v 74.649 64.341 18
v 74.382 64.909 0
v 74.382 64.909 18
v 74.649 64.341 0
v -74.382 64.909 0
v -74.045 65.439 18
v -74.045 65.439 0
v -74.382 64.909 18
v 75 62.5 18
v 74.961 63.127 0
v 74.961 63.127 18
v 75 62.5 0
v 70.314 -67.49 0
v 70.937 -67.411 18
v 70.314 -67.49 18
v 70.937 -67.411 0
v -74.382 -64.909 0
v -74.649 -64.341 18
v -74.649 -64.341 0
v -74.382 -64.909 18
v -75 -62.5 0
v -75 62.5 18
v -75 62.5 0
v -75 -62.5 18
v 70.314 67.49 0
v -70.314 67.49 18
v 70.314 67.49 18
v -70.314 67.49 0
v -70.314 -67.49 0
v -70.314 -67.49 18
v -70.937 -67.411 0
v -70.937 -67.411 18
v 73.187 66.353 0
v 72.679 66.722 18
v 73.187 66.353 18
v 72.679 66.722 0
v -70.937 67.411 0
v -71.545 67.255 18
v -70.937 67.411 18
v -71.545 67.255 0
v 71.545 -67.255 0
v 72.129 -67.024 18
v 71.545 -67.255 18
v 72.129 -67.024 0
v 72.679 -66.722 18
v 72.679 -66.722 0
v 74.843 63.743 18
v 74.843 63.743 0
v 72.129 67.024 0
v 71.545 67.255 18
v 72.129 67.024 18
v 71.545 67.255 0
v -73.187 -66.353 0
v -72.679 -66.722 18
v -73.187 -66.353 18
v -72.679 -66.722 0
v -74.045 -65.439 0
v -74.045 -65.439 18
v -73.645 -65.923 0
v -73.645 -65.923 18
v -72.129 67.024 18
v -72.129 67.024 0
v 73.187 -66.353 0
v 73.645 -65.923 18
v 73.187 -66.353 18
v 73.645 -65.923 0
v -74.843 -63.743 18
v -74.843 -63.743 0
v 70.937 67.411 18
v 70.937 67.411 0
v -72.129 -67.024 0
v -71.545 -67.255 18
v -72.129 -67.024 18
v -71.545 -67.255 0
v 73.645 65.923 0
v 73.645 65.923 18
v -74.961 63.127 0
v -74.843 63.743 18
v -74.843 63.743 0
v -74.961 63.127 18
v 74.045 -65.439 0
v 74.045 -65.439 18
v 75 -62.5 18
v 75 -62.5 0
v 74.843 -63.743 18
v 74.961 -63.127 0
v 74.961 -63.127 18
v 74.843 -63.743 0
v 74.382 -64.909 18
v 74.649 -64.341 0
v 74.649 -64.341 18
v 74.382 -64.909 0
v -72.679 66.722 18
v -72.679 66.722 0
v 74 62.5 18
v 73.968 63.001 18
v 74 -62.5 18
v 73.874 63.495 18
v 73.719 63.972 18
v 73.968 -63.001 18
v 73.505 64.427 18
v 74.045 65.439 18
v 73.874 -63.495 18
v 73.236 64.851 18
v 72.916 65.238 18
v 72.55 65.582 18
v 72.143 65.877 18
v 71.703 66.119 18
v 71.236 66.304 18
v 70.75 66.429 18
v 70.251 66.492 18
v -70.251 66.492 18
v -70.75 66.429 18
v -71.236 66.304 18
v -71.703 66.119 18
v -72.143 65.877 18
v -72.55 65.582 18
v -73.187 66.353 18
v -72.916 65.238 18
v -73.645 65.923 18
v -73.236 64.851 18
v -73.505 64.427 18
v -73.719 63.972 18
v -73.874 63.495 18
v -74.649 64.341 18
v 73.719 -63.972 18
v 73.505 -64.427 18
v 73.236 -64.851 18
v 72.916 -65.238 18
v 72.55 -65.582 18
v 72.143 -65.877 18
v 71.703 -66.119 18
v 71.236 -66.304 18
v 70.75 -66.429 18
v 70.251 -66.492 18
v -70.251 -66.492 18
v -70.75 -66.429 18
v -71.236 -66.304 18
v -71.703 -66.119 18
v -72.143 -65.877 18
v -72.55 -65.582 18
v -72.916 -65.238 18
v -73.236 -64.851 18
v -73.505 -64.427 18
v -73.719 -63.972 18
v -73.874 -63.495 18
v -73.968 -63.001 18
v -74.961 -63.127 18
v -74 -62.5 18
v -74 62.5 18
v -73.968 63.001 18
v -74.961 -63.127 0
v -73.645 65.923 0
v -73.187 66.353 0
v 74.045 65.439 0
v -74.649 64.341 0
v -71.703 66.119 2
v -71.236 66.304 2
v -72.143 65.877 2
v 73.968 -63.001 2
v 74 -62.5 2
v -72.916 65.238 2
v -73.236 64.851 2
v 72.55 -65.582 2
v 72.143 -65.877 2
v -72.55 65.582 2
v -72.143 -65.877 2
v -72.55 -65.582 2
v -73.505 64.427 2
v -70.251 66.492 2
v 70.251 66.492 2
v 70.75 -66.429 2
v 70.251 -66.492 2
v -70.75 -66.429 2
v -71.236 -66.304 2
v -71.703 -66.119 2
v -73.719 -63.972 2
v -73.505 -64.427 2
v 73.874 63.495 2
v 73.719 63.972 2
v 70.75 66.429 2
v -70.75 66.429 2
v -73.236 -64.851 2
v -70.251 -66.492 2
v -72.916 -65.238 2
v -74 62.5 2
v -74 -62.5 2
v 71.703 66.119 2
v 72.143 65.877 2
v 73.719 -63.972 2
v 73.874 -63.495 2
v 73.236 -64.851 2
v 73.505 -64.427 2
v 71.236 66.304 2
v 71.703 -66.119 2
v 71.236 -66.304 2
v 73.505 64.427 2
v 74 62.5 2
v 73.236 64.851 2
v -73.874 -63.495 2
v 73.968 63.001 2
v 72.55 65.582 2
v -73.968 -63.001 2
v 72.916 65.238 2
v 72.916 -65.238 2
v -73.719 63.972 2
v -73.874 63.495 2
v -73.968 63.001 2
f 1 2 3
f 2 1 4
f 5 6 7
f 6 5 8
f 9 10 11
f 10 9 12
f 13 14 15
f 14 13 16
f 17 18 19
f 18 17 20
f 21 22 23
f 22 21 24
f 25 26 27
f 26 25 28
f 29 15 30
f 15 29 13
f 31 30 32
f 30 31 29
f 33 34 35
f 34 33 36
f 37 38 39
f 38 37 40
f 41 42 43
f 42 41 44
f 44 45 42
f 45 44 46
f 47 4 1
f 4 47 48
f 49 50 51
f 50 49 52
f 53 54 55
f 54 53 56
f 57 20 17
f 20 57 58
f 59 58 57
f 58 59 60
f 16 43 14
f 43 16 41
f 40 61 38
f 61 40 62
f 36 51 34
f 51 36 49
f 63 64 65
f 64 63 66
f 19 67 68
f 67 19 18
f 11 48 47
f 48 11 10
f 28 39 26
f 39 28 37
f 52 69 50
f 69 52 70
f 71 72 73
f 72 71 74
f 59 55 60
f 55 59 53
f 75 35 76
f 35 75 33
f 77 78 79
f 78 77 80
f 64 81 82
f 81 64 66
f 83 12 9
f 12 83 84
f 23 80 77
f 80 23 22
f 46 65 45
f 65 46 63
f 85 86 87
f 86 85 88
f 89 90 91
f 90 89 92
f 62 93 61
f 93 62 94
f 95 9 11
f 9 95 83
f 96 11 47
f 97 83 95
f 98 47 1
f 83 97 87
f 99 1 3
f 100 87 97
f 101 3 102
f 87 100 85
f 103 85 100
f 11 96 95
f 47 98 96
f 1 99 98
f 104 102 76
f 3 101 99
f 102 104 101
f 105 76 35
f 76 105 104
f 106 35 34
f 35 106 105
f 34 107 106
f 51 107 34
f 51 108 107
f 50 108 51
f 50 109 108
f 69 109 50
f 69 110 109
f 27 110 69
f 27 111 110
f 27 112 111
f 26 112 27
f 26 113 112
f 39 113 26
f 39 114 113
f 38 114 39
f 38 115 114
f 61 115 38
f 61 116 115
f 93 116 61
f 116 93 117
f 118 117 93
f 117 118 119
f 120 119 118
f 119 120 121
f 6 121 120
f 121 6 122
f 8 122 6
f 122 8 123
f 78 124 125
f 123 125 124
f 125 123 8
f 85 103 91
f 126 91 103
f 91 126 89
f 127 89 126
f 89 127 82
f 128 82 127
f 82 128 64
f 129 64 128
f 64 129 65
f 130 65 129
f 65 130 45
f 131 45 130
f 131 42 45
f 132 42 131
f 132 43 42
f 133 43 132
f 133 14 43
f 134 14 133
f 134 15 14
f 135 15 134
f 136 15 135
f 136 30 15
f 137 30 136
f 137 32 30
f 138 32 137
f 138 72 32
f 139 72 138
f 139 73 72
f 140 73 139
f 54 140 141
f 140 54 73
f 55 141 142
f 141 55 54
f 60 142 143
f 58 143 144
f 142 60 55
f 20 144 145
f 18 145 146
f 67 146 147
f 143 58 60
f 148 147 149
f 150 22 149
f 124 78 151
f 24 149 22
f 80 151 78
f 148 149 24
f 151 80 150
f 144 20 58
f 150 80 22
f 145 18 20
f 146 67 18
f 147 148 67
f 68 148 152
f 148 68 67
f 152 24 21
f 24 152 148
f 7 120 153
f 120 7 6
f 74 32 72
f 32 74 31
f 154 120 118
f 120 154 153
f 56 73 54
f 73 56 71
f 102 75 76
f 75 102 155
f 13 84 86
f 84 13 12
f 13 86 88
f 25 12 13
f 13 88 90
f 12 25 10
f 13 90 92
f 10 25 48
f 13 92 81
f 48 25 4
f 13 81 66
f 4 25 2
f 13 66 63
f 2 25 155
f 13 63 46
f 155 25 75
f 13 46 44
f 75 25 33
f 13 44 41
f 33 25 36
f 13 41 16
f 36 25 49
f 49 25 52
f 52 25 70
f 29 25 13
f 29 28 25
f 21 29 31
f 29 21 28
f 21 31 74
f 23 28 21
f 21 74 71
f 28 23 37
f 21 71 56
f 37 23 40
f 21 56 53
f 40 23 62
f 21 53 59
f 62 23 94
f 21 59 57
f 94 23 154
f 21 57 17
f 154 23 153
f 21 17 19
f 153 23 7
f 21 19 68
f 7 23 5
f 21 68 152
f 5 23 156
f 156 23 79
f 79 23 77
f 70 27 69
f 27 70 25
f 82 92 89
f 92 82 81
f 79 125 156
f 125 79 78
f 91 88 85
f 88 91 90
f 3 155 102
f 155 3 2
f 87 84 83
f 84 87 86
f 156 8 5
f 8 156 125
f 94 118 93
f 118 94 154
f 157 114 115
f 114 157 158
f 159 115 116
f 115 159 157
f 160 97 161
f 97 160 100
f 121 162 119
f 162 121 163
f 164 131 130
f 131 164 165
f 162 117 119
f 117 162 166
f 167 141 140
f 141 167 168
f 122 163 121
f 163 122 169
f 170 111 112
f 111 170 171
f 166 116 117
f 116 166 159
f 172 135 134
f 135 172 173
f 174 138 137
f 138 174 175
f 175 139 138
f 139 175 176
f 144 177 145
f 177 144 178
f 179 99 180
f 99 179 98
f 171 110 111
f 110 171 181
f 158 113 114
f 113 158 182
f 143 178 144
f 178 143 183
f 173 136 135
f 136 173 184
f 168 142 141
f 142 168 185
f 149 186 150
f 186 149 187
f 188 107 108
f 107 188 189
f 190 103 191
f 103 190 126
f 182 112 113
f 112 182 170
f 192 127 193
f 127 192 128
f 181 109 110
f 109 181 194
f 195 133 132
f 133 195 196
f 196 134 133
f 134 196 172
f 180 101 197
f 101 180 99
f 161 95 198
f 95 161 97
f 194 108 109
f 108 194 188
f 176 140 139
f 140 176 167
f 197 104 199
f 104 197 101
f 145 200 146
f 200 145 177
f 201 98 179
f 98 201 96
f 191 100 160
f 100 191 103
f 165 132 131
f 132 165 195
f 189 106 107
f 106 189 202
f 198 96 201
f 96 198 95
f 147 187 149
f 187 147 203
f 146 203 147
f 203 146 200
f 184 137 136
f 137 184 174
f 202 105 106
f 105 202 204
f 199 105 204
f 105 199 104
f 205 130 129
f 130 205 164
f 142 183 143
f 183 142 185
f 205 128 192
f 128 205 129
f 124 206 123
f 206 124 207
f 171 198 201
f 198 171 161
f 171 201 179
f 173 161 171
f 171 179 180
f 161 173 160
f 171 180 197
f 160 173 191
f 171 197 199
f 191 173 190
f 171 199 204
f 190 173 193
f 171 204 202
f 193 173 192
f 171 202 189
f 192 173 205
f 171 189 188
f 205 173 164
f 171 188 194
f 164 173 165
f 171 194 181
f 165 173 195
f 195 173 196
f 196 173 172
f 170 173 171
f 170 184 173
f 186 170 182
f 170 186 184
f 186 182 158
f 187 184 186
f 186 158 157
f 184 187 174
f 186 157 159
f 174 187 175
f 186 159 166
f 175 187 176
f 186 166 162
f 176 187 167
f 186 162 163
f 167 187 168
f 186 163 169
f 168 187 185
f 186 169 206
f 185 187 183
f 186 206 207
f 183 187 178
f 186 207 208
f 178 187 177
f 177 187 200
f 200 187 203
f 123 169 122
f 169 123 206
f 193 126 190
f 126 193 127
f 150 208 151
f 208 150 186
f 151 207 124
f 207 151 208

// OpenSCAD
$fn = 50;


difference() {
	union() {
		hull() {
			translate(v = [-70.0000000000, 62.5000000000, 0]) {
				cylinder(h = 18, r = 5);
			}
			translate(v = [70.0000000000, 62.5000000000, 0]) {
				cylinder(h = 18, r = 5);
			}
			translate(v = [-70.0000000000, -62.5000000000, 0]) {
				cylinder(h = 18, r = 5);
			}
			translate(v = [70.0000000000, -62.5000000000, 0]) {
				cylinder(h = 18, r = 5);
			}
		}
	}
	union() {
		translate(v = [0, 0, 2]) {
			hull() {
				translate(v = [-70.0000000000, 62.5000000000, 0]) {
					cylinder(h = 16, r = 4);
				}
				translate(v = [70.0000000000, 62.5000000000, 0]) {
					cylinder(h = 16, r = 4);
				}
				translate(v = [-70.0000000000, -62.5000000000, 0]) {
					cylinder(h = 16, r = 4);
				}
				translate(v = [70.0000000000, -62.5000000000, 0]) {
					cylinder(h = 16, r = 4);
				}
			}
		}
	}
}
